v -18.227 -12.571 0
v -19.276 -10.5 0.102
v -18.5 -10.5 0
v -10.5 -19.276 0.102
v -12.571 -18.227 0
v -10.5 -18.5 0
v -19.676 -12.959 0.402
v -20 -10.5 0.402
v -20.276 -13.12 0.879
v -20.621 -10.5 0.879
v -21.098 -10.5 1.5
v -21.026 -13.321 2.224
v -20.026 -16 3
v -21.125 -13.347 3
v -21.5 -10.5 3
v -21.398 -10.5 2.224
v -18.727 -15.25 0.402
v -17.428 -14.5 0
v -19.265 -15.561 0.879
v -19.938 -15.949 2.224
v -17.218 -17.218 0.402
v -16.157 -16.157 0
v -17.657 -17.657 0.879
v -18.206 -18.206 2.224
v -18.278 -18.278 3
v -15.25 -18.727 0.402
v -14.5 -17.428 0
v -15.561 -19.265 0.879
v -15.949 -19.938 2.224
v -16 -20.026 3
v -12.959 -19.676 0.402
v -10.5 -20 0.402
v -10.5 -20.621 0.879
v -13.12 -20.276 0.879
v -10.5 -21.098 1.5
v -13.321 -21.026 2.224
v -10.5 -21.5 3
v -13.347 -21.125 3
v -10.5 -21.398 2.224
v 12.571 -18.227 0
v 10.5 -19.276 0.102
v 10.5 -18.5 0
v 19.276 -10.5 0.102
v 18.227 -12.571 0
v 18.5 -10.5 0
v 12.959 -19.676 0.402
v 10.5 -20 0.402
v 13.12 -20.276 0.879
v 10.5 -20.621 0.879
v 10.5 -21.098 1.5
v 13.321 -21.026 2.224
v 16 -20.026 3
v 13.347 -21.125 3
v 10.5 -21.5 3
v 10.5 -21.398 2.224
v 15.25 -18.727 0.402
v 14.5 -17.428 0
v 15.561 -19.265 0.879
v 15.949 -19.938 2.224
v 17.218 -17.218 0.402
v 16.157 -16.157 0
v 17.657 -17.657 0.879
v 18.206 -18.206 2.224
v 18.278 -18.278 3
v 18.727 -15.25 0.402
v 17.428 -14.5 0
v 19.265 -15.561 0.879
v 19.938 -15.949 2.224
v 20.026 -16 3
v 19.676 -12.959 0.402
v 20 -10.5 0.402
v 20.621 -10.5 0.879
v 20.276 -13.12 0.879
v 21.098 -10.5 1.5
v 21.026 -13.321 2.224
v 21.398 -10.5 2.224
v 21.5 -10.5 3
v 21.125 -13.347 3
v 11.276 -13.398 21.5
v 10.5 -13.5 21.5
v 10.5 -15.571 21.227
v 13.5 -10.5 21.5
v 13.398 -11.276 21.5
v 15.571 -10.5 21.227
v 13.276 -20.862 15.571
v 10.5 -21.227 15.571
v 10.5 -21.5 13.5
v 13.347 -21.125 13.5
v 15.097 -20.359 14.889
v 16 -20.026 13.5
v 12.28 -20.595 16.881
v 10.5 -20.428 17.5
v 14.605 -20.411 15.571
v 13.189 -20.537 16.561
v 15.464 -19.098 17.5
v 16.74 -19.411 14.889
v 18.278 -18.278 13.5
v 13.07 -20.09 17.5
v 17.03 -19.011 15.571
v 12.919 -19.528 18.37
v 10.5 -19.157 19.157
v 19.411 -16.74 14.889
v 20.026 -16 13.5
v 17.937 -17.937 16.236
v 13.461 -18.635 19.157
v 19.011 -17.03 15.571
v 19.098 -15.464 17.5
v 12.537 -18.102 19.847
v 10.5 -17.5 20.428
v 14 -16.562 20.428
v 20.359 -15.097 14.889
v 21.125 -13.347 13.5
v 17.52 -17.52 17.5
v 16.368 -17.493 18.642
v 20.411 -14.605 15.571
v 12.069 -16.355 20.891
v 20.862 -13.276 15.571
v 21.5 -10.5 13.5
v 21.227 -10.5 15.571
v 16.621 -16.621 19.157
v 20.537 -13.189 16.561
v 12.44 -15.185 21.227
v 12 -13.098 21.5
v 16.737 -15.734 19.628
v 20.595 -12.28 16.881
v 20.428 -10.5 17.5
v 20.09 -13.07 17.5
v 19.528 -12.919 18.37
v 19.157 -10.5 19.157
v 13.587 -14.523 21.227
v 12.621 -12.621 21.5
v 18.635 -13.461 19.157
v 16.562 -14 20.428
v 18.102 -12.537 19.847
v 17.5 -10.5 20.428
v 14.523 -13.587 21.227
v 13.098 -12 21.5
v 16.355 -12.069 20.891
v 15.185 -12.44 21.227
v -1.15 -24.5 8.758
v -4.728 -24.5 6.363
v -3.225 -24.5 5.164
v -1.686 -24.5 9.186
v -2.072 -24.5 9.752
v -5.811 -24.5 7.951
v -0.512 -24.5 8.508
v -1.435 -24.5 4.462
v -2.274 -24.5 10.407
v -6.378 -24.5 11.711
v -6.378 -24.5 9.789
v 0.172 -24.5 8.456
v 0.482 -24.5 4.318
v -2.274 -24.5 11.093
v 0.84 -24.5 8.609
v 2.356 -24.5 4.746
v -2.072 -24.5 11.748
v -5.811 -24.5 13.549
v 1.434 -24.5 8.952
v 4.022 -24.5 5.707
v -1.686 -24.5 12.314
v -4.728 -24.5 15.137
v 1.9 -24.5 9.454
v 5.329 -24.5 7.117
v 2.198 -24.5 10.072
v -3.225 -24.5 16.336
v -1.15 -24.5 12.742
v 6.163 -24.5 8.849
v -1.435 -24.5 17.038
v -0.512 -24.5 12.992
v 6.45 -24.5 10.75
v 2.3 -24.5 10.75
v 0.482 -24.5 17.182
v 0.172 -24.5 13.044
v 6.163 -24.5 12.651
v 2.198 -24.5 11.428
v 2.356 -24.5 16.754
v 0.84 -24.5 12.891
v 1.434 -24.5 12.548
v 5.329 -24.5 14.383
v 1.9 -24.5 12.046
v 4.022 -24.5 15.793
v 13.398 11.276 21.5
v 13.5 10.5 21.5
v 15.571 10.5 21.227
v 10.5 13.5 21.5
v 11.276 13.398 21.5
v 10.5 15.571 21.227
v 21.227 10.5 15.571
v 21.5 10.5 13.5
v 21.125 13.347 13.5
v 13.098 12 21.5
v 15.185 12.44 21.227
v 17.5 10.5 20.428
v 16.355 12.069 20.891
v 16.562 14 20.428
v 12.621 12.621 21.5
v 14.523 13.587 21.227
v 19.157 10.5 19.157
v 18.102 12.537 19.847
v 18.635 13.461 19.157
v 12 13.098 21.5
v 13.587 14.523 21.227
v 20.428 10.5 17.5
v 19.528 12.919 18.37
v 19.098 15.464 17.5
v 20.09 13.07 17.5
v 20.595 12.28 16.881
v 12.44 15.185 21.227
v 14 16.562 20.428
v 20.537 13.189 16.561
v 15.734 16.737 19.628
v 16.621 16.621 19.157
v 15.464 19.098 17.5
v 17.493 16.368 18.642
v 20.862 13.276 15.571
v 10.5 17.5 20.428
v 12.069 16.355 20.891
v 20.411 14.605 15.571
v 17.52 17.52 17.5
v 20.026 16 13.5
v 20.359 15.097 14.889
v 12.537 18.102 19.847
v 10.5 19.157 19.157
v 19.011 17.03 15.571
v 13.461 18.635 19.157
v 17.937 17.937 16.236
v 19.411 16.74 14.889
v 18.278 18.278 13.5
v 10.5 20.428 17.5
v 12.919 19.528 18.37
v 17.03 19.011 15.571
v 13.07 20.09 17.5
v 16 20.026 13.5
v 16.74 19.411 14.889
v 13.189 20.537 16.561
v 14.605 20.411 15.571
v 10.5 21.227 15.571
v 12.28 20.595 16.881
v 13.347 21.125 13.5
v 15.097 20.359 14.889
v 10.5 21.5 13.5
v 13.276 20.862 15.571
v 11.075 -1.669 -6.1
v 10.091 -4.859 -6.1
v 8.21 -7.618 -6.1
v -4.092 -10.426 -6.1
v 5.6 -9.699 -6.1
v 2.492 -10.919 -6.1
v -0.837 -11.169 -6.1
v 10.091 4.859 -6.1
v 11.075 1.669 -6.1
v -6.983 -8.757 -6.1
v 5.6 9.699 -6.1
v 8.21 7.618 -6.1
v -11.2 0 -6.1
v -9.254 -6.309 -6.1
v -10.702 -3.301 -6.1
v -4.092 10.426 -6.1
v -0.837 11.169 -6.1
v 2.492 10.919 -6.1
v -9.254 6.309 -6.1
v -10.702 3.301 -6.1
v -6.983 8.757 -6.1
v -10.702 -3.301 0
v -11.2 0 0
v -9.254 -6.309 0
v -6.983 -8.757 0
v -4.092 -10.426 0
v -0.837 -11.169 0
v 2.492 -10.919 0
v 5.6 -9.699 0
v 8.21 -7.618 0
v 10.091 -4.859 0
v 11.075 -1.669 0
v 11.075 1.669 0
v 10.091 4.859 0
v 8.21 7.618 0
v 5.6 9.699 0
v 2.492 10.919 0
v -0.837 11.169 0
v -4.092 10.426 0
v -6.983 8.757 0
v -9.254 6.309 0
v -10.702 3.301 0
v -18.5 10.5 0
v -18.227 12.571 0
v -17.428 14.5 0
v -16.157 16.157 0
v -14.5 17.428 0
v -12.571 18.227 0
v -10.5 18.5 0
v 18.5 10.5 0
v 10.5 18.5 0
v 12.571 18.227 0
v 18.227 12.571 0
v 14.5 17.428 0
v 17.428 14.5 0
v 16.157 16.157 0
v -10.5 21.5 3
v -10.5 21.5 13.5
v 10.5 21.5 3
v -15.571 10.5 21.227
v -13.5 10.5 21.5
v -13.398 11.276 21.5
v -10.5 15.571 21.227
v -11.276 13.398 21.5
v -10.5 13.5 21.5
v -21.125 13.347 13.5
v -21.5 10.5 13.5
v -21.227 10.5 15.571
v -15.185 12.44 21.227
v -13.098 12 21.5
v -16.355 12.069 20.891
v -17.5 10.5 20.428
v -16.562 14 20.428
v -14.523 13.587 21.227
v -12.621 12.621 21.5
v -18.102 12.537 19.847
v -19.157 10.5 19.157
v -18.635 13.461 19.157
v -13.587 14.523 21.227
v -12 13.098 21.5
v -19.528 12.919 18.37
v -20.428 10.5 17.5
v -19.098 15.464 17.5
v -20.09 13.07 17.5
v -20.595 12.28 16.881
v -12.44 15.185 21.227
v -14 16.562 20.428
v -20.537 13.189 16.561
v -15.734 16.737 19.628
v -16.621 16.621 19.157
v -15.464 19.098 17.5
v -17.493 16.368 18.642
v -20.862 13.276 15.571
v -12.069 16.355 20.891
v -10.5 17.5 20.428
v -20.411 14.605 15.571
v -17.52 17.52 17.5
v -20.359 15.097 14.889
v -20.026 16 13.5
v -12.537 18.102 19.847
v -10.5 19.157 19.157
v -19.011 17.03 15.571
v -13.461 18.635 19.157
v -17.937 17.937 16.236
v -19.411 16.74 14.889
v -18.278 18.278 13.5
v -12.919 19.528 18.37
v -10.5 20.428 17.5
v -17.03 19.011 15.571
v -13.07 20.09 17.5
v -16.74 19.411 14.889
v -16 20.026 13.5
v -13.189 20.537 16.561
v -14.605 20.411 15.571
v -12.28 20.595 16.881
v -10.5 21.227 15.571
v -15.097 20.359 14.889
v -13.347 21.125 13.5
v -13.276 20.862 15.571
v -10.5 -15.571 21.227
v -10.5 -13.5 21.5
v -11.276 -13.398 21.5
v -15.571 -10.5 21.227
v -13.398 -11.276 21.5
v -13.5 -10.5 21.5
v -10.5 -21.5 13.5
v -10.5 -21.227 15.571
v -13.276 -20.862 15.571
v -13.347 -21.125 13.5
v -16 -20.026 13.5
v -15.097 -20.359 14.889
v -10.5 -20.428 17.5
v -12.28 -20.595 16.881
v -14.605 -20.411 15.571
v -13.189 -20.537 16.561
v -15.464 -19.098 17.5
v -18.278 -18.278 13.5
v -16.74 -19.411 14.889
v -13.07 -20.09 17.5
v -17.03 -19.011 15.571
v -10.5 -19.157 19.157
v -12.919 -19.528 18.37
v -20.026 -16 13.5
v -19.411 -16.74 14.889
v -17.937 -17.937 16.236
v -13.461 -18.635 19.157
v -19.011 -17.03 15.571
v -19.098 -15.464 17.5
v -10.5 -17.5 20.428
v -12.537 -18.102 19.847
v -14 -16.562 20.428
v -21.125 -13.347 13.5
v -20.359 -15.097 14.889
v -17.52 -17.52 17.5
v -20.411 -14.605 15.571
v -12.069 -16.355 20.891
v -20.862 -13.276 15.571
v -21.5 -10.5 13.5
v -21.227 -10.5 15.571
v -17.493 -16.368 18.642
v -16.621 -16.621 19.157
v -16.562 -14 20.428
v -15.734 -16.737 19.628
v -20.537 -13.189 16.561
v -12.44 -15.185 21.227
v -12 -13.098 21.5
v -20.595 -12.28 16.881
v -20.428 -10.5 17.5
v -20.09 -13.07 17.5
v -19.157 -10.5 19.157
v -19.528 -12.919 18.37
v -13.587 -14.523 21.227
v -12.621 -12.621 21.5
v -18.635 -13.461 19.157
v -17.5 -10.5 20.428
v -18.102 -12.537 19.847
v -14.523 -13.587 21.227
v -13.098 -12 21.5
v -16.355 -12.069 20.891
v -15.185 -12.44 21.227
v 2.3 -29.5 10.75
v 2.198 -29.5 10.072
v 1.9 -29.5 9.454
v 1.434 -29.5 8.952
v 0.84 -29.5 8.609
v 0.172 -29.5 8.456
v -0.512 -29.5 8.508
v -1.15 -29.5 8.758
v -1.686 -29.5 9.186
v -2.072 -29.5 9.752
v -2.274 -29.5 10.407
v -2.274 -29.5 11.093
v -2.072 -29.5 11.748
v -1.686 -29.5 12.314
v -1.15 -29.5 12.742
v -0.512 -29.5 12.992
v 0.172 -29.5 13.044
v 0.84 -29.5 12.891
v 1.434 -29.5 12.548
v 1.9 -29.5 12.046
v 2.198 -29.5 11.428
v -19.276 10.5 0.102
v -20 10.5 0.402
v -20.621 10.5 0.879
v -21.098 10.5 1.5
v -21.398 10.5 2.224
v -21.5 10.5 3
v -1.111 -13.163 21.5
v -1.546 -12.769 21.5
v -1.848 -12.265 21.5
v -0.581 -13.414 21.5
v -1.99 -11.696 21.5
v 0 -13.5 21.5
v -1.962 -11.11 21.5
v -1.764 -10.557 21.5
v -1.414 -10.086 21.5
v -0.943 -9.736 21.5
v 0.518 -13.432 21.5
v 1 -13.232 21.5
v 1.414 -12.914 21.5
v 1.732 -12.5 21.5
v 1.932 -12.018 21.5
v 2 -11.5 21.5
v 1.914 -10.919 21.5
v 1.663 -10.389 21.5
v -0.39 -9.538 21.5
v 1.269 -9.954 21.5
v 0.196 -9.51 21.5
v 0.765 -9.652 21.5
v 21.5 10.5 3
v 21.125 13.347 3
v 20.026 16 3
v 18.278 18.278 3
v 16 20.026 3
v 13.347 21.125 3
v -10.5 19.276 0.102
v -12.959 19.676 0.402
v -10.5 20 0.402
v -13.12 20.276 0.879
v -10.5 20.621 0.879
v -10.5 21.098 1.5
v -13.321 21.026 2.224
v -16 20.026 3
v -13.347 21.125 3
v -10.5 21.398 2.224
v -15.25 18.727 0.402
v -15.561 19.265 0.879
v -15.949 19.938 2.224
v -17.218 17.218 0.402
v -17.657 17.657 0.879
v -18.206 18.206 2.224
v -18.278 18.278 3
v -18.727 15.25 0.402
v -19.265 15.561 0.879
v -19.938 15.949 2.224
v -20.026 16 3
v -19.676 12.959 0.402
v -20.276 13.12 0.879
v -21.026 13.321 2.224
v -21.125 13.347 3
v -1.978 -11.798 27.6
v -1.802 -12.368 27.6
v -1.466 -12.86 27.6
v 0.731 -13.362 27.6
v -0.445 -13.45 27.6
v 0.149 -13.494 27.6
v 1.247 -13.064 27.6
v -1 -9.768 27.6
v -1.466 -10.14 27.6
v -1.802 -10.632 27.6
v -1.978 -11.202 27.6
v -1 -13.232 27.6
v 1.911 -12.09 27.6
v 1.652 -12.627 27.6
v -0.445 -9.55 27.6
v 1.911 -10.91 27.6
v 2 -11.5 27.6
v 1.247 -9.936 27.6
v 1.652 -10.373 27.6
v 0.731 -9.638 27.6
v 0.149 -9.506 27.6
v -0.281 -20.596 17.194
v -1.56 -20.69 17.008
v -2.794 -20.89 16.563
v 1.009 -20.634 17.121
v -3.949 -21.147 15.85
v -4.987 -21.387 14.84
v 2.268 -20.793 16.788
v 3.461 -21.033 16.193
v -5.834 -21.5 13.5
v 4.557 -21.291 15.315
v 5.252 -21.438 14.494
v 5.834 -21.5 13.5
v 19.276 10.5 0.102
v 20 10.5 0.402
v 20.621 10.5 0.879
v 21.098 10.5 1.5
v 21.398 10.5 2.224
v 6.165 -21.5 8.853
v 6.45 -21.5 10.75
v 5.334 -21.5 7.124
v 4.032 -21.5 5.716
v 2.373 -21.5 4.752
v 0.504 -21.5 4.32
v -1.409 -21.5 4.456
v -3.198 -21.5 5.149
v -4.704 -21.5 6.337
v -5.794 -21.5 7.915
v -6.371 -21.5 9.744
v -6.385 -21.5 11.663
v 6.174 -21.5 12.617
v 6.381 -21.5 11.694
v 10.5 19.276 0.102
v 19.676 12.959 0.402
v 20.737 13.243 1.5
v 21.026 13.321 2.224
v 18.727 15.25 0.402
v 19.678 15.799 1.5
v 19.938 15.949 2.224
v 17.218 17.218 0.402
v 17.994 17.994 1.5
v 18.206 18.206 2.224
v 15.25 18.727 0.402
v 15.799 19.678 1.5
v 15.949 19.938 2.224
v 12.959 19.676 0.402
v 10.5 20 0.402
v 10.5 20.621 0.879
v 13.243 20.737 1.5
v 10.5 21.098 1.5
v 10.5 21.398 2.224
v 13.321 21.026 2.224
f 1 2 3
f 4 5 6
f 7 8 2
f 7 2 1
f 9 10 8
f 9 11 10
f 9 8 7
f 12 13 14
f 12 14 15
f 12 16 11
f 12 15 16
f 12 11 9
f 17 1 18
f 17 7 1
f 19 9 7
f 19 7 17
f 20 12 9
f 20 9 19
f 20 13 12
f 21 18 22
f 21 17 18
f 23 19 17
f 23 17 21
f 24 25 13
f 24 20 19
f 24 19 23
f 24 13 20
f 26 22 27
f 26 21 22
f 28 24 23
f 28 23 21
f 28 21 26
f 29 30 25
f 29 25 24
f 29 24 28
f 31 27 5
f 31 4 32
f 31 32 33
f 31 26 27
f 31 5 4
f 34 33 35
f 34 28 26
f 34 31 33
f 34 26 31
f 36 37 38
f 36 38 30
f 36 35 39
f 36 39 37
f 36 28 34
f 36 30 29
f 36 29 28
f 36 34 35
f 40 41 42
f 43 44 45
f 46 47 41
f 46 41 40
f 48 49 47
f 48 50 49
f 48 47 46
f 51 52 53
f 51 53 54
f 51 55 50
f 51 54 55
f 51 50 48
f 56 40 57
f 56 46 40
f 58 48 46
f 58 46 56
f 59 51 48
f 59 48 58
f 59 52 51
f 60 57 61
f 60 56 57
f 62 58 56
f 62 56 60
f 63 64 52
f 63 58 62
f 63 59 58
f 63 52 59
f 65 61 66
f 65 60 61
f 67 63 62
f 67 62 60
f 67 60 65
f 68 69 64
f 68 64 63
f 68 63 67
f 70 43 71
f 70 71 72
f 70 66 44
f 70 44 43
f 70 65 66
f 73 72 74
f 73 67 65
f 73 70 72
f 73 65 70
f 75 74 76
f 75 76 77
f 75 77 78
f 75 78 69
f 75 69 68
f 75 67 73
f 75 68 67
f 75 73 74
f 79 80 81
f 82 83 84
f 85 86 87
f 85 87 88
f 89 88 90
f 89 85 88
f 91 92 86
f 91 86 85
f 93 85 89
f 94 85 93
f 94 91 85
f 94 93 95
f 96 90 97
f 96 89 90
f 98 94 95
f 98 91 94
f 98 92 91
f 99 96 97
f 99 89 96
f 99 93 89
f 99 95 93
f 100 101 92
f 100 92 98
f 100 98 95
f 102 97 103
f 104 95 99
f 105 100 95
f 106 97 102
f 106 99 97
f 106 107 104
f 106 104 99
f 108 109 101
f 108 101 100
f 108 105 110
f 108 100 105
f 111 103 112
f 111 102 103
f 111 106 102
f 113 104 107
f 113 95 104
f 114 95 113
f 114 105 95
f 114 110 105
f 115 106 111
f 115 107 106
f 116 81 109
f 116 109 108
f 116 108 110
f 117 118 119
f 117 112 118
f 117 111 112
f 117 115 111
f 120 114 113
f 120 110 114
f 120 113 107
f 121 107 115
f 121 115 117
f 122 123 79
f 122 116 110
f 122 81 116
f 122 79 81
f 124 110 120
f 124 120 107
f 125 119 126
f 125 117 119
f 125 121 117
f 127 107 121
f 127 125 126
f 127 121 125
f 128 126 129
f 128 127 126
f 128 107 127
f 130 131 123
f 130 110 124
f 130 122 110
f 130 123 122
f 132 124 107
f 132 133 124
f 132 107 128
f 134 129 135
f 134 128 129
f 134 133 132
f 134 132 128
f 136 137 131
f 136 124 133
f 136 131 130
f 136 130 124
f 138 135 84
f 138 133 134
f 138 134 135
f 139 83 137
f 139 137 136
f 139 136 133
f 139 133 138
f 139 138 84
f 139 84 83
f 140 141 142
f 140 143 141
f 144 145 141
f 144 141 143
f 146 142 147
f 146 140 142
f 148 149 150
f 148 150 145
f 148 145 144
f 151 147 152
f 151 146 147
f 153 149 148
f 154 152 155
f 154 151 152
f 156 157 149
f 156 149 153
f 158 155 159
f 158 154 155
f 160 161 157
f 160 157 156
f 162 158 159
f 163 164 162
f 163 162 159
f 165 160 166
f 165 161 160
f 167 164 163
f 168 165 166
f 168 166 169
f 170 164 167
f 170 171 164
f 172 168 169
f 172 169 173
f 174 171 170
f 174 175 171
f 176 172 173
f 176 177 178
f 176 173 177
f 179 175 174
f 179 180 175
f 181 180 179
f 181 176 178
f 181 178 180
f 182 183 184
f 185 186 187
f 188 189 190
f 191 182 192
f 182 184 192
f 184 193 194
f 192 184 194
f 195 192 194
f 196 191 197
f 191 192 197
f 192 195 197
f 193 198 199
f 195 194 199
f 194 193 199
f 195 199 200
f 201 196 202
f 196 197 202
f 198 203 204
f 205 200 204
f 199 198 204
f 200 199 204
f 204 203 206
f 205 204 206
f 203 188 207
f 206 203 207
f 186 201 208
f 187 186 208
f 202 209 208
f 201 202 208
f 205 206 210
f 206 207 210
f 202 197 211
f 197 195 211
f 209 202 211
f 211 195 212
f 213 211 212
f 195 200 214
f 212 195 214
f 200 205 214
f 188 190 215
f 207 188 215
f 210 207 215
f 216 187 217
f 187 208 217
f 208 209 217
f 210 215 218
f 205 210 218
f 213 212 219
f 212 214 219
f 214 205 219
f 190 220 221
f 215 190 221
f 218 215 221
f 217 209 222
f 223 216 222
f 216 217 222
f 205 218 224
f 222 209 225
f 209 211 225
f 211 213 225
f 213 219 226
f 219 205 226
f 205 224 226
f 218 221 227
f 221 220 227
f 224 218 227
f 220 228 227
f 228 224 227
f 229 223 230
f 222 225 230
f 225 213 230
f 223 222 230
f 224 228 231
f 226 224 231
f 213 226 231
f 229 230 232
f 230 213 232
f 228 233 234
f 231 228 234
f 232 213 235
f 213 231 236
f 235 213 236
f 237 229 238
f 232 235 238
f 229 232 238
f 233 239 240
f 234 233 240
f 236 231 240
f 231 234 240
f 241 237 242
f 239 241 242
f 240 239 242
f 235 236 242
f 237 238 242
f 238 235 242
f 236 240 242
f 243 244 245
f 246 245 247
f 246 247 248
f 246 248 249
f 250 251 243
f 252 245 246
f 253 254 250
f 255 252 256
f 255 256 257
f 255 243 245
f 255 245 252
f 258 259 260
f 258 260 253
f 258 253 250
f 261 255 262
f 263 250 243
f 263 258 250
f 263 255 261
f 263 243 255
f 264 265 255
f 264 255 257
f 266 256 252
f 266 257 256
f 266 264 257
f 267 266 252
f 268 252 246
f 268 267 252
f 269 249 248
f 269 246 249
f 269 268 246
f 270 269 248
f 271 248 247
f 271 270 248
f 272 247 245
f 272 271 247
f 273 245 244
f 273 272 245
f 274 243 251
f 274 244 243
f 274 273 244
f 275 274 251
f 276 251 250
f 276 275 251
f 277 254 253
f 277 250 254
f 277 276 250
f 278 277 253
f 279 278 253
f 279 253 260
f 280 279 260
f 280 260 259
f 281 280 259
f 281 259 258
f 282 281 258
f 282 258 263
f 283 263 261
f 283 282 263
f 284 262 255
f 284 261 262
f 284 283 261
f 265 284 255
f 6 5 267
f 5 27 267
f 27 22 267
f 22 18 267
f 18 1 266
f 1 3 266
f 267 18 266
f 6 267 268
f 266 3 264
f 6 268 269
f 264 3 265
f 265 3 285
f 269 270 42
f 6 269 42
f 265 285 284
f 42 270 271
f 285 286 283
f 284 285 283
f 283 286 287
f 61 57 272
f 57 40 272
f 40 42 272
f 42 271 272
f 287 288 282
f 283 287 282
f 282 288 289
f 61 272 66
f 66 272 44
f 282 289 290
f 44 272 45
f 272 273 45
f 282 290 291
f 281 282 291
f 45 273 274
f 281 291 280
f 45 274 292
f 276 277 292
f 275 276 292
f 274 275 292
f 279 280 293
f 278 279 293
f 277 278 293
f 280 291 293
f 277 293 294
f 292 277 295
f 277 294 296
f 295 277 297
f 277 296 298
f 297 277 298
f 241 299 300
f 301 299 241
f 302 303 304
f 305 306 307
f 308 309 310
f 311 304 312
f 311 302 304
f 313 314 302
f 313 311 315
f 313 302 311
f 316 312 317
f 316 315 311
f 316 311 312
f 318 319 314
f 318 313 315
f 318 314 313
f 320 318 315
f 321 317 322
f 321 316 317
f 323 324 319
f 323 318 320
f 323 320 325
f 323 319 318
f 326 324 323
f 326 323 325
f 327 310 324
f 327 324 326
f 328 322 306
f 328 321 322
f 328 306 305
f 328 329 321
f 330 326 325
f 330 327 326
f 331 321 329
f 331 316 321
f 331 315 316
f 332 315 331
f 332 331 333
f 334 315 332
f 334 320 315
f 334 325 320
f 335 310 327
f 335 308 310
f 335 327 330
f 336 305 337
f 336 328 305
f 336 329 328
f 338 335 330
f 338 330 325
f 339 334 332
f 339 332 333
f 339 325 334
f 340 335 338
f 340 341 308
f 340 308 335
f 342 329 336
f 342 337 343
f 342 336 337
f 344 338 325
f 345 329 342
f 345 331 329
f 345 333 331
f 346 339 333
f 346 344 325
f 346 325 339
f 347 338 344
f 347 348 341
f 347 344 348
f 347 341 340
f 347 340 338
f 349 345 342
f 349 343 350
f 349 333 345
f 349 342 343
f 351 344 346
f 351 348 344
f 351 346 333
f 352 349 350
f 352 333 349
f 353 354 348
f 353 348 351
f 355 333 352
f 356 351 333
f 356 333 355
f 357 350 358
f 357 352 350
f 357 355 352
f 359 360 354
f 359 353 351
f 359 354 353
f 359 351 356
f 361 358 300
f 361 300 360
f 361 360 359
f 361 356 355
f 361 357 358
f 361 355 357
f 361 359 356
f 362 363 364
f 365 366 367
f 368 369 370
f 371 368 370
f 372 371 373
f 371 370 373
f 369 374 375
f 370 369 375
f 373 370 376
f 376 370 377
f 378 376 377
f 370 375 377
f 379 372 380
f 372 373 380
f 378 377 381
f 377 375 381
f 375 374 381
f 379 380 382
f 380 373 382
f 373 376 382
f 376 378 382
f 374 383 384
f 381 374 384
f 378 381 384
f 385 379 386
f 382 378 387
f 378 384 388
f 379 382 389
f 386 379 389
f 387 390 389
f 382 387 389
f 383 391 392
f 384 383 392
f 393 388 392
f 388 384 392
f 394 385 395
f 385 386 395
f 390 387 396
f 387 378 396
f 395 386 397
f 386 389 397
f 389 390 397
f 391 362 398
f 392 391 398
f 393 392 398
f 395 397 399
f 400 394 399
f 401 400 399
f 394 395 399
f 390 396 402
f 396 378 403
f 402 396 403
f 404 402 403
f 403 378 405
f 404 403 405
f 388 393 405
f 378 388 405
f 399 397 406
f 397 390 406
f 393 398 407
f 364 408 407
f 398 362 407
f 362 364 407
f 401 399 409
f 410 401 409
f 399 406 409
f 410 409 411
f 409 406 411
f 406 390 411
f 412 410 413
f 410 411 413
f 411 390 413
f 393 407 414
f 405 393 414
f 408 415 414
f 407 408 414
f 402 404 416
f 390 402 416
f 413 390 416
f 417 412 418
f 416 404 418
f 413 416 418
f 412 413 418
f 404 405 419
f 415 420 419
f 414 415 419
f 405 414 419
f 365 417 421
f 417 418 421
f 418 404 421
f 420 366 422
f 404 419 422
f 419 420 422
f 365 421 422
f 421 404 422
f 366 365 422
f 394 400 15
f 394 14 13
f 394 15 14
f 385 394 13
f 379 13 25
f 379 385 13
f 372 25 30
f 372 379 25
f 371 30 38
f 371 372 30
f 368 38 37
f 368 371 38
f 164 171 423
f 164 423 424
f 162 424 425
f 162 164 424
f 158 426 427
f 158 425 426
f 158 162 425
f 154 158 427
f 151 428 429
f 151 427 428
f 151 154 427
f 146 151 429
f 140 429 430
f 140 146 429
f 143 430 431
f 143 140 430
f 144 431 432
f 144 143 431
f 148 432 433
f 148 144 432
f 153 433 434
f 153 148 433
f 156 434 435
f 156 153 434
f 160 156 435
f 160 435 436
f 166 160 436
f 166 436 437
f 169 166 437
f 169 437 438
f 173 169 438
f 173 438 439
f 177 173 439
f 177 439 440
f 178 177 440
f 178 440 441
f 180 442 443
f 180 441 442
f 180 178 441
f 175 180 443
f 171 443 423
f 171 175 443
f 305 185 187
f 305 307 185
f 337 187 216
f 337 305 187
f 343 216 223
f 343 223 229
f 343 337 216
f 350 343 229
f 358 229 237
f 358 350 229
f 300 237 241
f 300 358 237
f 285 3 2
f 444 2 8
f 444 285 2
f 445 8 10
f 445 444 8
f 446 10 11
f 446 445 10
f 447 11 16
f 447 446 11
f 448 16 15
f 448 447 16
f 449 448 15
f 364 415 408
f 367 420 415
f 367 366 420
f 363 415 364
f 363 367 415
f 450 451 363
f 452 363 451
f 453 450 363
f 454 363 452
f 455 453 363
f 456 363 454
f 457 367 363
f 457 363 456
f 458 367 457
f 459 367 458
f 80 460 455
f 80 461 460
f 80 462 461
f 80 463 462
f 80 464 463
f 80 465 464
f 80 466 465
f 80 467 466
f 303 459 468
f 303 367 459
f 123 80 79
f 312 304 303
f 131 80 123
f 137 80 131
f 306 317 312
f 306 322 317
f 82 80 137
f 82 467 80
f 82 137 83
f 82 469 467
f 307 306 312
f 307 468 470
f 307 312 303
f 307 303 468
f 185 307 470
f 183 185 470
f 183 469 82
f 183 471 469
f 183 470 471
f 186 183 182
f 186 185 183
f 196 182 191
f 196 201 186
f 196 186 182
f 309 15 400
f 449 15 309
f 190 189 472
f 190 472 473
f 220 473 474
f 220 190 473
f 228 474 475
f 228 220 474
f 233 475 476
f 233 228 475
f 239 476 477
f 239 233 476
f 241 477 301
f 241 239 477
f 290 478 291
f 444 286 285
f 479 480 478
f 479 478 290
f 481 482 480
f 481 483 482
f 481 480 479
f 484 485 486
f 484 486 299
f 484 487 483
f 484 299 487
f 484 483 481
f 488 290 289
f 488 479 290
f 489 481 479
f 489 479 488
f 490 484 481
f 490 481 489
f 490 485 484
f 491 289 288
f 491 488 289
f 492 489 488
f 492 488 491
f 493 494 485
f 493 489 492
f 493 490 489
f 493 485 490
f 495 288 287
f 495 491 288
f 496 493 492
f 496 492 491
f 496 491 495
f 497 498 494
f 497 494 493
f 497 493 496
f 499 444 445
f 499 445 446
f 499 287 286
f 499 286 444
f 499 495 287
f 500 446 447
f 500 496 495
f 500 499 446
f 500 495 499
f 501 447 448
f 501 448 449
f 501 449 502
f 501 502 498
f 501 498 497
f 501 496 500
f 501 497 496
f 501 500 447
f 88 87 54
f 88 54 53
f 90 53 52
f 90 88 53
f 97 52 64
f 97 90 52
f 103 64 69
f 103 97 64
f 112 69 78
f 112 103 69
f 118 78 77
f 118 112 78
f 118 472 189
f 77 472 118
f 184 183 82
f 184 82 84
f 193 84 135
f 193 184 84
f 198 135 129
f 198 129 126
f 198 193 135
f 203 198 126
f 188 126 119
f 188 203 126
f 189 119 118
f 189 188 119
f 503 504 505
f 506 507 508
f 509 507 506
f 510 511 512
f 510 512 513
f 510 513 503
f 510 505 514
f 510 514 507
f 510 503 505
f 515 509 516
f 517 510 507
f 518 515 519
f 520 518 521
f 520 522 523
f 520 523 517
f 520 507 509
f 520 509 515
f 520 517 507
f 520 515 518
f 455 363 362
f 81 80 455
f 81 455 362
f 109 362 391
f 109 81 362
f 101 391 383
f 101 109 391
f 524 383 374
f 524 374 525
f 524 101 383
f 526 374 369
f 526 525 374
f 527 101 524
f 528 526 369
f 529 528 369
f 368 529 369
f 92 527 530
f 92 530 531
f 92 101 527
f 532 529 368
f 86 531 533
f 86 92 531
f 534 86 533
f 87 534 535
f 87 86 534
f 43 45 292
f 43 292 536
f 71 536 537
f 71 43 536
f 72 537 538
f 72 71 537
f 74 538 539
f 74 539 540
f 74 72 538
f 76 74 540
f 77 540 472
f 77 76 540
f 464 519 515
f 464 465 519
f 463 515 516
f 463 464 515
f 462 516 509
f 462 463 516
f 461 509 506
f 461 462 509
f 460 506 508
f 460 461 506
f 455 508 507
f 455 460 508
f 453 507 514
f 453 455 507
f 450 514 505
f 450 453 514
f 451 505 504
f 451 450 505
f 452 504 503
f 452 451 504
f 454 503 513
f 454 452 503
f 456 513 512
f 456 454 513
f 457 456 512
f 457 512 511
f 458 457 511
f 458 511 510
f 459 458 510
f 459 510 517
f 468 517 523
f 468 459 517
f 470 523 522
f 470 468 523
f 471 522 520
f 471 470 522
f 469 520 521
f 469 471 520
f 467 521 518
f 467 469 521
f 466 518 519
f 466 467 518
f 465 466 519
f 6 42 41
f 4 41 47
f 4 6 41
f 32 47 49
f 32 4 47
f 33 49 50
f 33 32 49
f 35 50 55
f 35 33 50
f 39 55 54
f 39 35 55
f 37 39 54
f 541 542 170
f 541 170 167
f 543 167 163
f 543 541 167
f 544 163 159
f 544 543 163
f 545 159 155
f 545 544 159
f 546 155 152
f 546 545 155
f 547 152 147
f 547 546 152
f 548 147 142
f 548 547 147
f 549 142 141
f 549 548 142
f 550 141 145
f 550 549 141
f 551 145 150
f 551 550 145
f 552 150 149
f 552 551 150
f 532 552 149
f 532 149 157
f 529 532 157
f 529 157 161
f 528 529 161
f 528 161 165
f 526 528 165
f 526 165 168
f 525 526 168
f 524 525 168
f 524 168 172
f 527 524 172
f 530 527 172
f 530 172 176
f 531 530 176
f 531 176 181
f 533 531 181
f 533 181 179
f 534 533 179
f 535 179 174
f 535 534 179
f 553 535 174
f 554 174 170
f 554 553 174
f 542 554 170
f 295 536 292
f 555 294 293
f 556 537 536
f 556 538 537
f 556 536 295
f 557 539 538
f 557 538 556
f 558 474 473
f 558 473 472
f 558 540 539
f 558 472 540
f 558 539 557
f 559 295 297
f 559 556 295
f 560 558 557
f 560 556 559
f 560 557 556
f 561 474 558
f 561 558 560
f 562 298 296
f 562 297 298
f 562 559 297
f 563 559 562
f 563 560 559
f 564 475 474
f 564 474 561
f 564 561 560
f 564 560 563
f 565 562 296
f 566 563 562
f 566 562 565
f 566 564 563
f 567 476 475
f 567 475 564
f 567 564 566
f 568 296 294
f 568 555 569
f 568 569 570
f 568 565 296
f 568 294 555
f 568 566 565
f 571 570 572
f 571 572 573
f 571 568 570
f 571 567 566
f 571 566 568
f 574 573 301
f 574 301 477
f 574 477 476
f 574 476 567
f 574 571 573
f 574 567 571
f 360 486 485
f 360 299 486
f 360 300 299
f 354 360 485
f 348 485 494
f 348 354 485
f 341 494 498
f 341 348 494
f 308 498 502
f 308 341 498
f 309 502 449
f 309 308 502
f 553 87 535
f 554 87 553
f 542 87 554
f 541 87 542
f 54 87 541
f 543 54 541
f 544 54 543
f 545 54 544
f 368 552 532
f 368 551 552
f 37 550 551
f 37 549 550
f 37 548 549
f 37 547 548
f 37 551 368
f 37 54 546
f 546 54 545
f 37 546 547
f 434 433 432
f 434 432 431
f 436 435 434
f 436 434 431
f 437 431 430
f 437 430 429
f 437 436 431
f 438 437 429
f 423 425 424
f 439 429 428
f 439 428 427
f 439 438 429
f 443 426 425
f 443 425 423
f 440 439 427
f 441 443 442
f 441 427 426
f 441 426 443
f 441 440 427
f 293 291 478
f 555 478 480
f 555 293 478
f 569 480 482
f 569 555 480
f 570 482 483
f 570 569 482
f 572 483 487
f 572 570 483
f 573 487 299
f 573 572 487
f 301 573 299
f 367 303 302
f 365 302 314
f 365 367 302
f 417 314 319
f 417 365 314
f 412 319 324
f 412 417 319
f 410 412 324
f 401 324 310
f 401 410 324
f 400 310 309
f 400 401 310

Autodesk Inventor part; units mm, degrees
ref_plane "YZ Plane" through (0, 0, 0) normal (1, 0, 0) x (0, 1, 0)
ref_plane "XZ Plane" through (0, 0, 0) normal (0, 1, 0) x (-1, 0, 0)
ref_plane "XY Plane" through (0, 0, 0) normal (0, 0, 1) x (1, 0, 0)
sketch "스케치1" plane through (0, 0, 0) normal (0, 0, 1) x (1, 0, 0)
  line L0 (21.5, -21.5) -> (-21.5, -21.5)
  line L1 (-21.5, -21.5) -> (-21.5, 21.5)
  line L2 (-21.5, 21.5) -> (21.5, 21.5)
  line L3 (21.5, 21.5) -> (21.5, -21.5)
  line L4 (21.5, -21.5) -> (-21.5, 21.5) construction
  line L5 (-21.5, -21.5) -> (21.5, 21.5) construction
  point P0 (0, 0)
  dimension "d0" = 43
  dimension "d1" = 43
extrude "돌출1" add sketch "스케치1" along normal blind 21.5
sketch "스케치2" plane through (0, 0, 0) normal (0, 0, -1) x (-1, 0, 0)
  circle A0 centre (0, 0) radius 11.2
  dimension "d4" = 22.4
extrude "돌출2" add sketch "스케치2" along normal blind 6.1
sketch "스케치3" plane through (0, 0, 21.5) normal (0, 0, 1) x (1, 0, 0)
  line L0 (-21.5, -21.5) -> (21.5, -21.5) projected
  circle A0 centre (0, -11.5) radius 2
  point P0 (0, 0)
  dimension "d7" = 4
  dimension "d8" = 10
extrude "돌출3" add sketch "스케치3" along normal blind 6.1
sketch "스케치4" plane through (-21.5, -21.5, 0) normal (0, -1, 0) x (1, 0, 0)
  line L0 (43, 0) -> (43, 21.5) projected
  line L1 (0, 21.5) -> (43, 21.5) projected
  line L2 (0, 0) -> (0, 21.5) projected
  line L3 (43, 10.75) -> (0, 10.75) construction
  line L4 (21.5, 0) -> (21.5, 21.5) construction
  circle A0 centre (21.5, 10.75) radius 6.45
  circle A1 centre (21.5, 10.75) radius 2.3
  dimension "d11" = 12.9
  dimension "d12" = 4.6
extrude "돌출4" add sketch "스케치4" along normal blind 8 contours A1
extrude "돌출5" add sketch "스케치4" along normal blind 3
fillet "모깎기1" radius 11 4 edges at (-21.5, -21.5, 10.75) (21.5, -21.5, 10.75) (-21.5, 21.5, 10.75) (21.5, 21.5, 10.75)
fillet "모깎기2" radius 8 8 edges at (0, -21.5, 21.5) (-18.2782, -18.2782, 21.5) (-21.5, 0, 21.5) (-18.2782, 18.2782, 21.5) (0, 21.5, 21.5) (18.2782, 18.2782, 21.5) (21.5, 0, 21.5) (18.2782, -18.2782, 21.5)
fillet "모깎기3" radius 3 8 edges at (21.5, 0, 0) (18.2782, 18.2782, 0) (0, 21.5, 0) (-18.2782, 18.2782, 0) (-21.5, 0, 0) (-18.2782, -18.2782, 0) (0, -21.5, 0) (18.2782, -18.2782, 0)
equation "\"d1\" = d0"
properties part number "camera" material "고무, 검은색"
